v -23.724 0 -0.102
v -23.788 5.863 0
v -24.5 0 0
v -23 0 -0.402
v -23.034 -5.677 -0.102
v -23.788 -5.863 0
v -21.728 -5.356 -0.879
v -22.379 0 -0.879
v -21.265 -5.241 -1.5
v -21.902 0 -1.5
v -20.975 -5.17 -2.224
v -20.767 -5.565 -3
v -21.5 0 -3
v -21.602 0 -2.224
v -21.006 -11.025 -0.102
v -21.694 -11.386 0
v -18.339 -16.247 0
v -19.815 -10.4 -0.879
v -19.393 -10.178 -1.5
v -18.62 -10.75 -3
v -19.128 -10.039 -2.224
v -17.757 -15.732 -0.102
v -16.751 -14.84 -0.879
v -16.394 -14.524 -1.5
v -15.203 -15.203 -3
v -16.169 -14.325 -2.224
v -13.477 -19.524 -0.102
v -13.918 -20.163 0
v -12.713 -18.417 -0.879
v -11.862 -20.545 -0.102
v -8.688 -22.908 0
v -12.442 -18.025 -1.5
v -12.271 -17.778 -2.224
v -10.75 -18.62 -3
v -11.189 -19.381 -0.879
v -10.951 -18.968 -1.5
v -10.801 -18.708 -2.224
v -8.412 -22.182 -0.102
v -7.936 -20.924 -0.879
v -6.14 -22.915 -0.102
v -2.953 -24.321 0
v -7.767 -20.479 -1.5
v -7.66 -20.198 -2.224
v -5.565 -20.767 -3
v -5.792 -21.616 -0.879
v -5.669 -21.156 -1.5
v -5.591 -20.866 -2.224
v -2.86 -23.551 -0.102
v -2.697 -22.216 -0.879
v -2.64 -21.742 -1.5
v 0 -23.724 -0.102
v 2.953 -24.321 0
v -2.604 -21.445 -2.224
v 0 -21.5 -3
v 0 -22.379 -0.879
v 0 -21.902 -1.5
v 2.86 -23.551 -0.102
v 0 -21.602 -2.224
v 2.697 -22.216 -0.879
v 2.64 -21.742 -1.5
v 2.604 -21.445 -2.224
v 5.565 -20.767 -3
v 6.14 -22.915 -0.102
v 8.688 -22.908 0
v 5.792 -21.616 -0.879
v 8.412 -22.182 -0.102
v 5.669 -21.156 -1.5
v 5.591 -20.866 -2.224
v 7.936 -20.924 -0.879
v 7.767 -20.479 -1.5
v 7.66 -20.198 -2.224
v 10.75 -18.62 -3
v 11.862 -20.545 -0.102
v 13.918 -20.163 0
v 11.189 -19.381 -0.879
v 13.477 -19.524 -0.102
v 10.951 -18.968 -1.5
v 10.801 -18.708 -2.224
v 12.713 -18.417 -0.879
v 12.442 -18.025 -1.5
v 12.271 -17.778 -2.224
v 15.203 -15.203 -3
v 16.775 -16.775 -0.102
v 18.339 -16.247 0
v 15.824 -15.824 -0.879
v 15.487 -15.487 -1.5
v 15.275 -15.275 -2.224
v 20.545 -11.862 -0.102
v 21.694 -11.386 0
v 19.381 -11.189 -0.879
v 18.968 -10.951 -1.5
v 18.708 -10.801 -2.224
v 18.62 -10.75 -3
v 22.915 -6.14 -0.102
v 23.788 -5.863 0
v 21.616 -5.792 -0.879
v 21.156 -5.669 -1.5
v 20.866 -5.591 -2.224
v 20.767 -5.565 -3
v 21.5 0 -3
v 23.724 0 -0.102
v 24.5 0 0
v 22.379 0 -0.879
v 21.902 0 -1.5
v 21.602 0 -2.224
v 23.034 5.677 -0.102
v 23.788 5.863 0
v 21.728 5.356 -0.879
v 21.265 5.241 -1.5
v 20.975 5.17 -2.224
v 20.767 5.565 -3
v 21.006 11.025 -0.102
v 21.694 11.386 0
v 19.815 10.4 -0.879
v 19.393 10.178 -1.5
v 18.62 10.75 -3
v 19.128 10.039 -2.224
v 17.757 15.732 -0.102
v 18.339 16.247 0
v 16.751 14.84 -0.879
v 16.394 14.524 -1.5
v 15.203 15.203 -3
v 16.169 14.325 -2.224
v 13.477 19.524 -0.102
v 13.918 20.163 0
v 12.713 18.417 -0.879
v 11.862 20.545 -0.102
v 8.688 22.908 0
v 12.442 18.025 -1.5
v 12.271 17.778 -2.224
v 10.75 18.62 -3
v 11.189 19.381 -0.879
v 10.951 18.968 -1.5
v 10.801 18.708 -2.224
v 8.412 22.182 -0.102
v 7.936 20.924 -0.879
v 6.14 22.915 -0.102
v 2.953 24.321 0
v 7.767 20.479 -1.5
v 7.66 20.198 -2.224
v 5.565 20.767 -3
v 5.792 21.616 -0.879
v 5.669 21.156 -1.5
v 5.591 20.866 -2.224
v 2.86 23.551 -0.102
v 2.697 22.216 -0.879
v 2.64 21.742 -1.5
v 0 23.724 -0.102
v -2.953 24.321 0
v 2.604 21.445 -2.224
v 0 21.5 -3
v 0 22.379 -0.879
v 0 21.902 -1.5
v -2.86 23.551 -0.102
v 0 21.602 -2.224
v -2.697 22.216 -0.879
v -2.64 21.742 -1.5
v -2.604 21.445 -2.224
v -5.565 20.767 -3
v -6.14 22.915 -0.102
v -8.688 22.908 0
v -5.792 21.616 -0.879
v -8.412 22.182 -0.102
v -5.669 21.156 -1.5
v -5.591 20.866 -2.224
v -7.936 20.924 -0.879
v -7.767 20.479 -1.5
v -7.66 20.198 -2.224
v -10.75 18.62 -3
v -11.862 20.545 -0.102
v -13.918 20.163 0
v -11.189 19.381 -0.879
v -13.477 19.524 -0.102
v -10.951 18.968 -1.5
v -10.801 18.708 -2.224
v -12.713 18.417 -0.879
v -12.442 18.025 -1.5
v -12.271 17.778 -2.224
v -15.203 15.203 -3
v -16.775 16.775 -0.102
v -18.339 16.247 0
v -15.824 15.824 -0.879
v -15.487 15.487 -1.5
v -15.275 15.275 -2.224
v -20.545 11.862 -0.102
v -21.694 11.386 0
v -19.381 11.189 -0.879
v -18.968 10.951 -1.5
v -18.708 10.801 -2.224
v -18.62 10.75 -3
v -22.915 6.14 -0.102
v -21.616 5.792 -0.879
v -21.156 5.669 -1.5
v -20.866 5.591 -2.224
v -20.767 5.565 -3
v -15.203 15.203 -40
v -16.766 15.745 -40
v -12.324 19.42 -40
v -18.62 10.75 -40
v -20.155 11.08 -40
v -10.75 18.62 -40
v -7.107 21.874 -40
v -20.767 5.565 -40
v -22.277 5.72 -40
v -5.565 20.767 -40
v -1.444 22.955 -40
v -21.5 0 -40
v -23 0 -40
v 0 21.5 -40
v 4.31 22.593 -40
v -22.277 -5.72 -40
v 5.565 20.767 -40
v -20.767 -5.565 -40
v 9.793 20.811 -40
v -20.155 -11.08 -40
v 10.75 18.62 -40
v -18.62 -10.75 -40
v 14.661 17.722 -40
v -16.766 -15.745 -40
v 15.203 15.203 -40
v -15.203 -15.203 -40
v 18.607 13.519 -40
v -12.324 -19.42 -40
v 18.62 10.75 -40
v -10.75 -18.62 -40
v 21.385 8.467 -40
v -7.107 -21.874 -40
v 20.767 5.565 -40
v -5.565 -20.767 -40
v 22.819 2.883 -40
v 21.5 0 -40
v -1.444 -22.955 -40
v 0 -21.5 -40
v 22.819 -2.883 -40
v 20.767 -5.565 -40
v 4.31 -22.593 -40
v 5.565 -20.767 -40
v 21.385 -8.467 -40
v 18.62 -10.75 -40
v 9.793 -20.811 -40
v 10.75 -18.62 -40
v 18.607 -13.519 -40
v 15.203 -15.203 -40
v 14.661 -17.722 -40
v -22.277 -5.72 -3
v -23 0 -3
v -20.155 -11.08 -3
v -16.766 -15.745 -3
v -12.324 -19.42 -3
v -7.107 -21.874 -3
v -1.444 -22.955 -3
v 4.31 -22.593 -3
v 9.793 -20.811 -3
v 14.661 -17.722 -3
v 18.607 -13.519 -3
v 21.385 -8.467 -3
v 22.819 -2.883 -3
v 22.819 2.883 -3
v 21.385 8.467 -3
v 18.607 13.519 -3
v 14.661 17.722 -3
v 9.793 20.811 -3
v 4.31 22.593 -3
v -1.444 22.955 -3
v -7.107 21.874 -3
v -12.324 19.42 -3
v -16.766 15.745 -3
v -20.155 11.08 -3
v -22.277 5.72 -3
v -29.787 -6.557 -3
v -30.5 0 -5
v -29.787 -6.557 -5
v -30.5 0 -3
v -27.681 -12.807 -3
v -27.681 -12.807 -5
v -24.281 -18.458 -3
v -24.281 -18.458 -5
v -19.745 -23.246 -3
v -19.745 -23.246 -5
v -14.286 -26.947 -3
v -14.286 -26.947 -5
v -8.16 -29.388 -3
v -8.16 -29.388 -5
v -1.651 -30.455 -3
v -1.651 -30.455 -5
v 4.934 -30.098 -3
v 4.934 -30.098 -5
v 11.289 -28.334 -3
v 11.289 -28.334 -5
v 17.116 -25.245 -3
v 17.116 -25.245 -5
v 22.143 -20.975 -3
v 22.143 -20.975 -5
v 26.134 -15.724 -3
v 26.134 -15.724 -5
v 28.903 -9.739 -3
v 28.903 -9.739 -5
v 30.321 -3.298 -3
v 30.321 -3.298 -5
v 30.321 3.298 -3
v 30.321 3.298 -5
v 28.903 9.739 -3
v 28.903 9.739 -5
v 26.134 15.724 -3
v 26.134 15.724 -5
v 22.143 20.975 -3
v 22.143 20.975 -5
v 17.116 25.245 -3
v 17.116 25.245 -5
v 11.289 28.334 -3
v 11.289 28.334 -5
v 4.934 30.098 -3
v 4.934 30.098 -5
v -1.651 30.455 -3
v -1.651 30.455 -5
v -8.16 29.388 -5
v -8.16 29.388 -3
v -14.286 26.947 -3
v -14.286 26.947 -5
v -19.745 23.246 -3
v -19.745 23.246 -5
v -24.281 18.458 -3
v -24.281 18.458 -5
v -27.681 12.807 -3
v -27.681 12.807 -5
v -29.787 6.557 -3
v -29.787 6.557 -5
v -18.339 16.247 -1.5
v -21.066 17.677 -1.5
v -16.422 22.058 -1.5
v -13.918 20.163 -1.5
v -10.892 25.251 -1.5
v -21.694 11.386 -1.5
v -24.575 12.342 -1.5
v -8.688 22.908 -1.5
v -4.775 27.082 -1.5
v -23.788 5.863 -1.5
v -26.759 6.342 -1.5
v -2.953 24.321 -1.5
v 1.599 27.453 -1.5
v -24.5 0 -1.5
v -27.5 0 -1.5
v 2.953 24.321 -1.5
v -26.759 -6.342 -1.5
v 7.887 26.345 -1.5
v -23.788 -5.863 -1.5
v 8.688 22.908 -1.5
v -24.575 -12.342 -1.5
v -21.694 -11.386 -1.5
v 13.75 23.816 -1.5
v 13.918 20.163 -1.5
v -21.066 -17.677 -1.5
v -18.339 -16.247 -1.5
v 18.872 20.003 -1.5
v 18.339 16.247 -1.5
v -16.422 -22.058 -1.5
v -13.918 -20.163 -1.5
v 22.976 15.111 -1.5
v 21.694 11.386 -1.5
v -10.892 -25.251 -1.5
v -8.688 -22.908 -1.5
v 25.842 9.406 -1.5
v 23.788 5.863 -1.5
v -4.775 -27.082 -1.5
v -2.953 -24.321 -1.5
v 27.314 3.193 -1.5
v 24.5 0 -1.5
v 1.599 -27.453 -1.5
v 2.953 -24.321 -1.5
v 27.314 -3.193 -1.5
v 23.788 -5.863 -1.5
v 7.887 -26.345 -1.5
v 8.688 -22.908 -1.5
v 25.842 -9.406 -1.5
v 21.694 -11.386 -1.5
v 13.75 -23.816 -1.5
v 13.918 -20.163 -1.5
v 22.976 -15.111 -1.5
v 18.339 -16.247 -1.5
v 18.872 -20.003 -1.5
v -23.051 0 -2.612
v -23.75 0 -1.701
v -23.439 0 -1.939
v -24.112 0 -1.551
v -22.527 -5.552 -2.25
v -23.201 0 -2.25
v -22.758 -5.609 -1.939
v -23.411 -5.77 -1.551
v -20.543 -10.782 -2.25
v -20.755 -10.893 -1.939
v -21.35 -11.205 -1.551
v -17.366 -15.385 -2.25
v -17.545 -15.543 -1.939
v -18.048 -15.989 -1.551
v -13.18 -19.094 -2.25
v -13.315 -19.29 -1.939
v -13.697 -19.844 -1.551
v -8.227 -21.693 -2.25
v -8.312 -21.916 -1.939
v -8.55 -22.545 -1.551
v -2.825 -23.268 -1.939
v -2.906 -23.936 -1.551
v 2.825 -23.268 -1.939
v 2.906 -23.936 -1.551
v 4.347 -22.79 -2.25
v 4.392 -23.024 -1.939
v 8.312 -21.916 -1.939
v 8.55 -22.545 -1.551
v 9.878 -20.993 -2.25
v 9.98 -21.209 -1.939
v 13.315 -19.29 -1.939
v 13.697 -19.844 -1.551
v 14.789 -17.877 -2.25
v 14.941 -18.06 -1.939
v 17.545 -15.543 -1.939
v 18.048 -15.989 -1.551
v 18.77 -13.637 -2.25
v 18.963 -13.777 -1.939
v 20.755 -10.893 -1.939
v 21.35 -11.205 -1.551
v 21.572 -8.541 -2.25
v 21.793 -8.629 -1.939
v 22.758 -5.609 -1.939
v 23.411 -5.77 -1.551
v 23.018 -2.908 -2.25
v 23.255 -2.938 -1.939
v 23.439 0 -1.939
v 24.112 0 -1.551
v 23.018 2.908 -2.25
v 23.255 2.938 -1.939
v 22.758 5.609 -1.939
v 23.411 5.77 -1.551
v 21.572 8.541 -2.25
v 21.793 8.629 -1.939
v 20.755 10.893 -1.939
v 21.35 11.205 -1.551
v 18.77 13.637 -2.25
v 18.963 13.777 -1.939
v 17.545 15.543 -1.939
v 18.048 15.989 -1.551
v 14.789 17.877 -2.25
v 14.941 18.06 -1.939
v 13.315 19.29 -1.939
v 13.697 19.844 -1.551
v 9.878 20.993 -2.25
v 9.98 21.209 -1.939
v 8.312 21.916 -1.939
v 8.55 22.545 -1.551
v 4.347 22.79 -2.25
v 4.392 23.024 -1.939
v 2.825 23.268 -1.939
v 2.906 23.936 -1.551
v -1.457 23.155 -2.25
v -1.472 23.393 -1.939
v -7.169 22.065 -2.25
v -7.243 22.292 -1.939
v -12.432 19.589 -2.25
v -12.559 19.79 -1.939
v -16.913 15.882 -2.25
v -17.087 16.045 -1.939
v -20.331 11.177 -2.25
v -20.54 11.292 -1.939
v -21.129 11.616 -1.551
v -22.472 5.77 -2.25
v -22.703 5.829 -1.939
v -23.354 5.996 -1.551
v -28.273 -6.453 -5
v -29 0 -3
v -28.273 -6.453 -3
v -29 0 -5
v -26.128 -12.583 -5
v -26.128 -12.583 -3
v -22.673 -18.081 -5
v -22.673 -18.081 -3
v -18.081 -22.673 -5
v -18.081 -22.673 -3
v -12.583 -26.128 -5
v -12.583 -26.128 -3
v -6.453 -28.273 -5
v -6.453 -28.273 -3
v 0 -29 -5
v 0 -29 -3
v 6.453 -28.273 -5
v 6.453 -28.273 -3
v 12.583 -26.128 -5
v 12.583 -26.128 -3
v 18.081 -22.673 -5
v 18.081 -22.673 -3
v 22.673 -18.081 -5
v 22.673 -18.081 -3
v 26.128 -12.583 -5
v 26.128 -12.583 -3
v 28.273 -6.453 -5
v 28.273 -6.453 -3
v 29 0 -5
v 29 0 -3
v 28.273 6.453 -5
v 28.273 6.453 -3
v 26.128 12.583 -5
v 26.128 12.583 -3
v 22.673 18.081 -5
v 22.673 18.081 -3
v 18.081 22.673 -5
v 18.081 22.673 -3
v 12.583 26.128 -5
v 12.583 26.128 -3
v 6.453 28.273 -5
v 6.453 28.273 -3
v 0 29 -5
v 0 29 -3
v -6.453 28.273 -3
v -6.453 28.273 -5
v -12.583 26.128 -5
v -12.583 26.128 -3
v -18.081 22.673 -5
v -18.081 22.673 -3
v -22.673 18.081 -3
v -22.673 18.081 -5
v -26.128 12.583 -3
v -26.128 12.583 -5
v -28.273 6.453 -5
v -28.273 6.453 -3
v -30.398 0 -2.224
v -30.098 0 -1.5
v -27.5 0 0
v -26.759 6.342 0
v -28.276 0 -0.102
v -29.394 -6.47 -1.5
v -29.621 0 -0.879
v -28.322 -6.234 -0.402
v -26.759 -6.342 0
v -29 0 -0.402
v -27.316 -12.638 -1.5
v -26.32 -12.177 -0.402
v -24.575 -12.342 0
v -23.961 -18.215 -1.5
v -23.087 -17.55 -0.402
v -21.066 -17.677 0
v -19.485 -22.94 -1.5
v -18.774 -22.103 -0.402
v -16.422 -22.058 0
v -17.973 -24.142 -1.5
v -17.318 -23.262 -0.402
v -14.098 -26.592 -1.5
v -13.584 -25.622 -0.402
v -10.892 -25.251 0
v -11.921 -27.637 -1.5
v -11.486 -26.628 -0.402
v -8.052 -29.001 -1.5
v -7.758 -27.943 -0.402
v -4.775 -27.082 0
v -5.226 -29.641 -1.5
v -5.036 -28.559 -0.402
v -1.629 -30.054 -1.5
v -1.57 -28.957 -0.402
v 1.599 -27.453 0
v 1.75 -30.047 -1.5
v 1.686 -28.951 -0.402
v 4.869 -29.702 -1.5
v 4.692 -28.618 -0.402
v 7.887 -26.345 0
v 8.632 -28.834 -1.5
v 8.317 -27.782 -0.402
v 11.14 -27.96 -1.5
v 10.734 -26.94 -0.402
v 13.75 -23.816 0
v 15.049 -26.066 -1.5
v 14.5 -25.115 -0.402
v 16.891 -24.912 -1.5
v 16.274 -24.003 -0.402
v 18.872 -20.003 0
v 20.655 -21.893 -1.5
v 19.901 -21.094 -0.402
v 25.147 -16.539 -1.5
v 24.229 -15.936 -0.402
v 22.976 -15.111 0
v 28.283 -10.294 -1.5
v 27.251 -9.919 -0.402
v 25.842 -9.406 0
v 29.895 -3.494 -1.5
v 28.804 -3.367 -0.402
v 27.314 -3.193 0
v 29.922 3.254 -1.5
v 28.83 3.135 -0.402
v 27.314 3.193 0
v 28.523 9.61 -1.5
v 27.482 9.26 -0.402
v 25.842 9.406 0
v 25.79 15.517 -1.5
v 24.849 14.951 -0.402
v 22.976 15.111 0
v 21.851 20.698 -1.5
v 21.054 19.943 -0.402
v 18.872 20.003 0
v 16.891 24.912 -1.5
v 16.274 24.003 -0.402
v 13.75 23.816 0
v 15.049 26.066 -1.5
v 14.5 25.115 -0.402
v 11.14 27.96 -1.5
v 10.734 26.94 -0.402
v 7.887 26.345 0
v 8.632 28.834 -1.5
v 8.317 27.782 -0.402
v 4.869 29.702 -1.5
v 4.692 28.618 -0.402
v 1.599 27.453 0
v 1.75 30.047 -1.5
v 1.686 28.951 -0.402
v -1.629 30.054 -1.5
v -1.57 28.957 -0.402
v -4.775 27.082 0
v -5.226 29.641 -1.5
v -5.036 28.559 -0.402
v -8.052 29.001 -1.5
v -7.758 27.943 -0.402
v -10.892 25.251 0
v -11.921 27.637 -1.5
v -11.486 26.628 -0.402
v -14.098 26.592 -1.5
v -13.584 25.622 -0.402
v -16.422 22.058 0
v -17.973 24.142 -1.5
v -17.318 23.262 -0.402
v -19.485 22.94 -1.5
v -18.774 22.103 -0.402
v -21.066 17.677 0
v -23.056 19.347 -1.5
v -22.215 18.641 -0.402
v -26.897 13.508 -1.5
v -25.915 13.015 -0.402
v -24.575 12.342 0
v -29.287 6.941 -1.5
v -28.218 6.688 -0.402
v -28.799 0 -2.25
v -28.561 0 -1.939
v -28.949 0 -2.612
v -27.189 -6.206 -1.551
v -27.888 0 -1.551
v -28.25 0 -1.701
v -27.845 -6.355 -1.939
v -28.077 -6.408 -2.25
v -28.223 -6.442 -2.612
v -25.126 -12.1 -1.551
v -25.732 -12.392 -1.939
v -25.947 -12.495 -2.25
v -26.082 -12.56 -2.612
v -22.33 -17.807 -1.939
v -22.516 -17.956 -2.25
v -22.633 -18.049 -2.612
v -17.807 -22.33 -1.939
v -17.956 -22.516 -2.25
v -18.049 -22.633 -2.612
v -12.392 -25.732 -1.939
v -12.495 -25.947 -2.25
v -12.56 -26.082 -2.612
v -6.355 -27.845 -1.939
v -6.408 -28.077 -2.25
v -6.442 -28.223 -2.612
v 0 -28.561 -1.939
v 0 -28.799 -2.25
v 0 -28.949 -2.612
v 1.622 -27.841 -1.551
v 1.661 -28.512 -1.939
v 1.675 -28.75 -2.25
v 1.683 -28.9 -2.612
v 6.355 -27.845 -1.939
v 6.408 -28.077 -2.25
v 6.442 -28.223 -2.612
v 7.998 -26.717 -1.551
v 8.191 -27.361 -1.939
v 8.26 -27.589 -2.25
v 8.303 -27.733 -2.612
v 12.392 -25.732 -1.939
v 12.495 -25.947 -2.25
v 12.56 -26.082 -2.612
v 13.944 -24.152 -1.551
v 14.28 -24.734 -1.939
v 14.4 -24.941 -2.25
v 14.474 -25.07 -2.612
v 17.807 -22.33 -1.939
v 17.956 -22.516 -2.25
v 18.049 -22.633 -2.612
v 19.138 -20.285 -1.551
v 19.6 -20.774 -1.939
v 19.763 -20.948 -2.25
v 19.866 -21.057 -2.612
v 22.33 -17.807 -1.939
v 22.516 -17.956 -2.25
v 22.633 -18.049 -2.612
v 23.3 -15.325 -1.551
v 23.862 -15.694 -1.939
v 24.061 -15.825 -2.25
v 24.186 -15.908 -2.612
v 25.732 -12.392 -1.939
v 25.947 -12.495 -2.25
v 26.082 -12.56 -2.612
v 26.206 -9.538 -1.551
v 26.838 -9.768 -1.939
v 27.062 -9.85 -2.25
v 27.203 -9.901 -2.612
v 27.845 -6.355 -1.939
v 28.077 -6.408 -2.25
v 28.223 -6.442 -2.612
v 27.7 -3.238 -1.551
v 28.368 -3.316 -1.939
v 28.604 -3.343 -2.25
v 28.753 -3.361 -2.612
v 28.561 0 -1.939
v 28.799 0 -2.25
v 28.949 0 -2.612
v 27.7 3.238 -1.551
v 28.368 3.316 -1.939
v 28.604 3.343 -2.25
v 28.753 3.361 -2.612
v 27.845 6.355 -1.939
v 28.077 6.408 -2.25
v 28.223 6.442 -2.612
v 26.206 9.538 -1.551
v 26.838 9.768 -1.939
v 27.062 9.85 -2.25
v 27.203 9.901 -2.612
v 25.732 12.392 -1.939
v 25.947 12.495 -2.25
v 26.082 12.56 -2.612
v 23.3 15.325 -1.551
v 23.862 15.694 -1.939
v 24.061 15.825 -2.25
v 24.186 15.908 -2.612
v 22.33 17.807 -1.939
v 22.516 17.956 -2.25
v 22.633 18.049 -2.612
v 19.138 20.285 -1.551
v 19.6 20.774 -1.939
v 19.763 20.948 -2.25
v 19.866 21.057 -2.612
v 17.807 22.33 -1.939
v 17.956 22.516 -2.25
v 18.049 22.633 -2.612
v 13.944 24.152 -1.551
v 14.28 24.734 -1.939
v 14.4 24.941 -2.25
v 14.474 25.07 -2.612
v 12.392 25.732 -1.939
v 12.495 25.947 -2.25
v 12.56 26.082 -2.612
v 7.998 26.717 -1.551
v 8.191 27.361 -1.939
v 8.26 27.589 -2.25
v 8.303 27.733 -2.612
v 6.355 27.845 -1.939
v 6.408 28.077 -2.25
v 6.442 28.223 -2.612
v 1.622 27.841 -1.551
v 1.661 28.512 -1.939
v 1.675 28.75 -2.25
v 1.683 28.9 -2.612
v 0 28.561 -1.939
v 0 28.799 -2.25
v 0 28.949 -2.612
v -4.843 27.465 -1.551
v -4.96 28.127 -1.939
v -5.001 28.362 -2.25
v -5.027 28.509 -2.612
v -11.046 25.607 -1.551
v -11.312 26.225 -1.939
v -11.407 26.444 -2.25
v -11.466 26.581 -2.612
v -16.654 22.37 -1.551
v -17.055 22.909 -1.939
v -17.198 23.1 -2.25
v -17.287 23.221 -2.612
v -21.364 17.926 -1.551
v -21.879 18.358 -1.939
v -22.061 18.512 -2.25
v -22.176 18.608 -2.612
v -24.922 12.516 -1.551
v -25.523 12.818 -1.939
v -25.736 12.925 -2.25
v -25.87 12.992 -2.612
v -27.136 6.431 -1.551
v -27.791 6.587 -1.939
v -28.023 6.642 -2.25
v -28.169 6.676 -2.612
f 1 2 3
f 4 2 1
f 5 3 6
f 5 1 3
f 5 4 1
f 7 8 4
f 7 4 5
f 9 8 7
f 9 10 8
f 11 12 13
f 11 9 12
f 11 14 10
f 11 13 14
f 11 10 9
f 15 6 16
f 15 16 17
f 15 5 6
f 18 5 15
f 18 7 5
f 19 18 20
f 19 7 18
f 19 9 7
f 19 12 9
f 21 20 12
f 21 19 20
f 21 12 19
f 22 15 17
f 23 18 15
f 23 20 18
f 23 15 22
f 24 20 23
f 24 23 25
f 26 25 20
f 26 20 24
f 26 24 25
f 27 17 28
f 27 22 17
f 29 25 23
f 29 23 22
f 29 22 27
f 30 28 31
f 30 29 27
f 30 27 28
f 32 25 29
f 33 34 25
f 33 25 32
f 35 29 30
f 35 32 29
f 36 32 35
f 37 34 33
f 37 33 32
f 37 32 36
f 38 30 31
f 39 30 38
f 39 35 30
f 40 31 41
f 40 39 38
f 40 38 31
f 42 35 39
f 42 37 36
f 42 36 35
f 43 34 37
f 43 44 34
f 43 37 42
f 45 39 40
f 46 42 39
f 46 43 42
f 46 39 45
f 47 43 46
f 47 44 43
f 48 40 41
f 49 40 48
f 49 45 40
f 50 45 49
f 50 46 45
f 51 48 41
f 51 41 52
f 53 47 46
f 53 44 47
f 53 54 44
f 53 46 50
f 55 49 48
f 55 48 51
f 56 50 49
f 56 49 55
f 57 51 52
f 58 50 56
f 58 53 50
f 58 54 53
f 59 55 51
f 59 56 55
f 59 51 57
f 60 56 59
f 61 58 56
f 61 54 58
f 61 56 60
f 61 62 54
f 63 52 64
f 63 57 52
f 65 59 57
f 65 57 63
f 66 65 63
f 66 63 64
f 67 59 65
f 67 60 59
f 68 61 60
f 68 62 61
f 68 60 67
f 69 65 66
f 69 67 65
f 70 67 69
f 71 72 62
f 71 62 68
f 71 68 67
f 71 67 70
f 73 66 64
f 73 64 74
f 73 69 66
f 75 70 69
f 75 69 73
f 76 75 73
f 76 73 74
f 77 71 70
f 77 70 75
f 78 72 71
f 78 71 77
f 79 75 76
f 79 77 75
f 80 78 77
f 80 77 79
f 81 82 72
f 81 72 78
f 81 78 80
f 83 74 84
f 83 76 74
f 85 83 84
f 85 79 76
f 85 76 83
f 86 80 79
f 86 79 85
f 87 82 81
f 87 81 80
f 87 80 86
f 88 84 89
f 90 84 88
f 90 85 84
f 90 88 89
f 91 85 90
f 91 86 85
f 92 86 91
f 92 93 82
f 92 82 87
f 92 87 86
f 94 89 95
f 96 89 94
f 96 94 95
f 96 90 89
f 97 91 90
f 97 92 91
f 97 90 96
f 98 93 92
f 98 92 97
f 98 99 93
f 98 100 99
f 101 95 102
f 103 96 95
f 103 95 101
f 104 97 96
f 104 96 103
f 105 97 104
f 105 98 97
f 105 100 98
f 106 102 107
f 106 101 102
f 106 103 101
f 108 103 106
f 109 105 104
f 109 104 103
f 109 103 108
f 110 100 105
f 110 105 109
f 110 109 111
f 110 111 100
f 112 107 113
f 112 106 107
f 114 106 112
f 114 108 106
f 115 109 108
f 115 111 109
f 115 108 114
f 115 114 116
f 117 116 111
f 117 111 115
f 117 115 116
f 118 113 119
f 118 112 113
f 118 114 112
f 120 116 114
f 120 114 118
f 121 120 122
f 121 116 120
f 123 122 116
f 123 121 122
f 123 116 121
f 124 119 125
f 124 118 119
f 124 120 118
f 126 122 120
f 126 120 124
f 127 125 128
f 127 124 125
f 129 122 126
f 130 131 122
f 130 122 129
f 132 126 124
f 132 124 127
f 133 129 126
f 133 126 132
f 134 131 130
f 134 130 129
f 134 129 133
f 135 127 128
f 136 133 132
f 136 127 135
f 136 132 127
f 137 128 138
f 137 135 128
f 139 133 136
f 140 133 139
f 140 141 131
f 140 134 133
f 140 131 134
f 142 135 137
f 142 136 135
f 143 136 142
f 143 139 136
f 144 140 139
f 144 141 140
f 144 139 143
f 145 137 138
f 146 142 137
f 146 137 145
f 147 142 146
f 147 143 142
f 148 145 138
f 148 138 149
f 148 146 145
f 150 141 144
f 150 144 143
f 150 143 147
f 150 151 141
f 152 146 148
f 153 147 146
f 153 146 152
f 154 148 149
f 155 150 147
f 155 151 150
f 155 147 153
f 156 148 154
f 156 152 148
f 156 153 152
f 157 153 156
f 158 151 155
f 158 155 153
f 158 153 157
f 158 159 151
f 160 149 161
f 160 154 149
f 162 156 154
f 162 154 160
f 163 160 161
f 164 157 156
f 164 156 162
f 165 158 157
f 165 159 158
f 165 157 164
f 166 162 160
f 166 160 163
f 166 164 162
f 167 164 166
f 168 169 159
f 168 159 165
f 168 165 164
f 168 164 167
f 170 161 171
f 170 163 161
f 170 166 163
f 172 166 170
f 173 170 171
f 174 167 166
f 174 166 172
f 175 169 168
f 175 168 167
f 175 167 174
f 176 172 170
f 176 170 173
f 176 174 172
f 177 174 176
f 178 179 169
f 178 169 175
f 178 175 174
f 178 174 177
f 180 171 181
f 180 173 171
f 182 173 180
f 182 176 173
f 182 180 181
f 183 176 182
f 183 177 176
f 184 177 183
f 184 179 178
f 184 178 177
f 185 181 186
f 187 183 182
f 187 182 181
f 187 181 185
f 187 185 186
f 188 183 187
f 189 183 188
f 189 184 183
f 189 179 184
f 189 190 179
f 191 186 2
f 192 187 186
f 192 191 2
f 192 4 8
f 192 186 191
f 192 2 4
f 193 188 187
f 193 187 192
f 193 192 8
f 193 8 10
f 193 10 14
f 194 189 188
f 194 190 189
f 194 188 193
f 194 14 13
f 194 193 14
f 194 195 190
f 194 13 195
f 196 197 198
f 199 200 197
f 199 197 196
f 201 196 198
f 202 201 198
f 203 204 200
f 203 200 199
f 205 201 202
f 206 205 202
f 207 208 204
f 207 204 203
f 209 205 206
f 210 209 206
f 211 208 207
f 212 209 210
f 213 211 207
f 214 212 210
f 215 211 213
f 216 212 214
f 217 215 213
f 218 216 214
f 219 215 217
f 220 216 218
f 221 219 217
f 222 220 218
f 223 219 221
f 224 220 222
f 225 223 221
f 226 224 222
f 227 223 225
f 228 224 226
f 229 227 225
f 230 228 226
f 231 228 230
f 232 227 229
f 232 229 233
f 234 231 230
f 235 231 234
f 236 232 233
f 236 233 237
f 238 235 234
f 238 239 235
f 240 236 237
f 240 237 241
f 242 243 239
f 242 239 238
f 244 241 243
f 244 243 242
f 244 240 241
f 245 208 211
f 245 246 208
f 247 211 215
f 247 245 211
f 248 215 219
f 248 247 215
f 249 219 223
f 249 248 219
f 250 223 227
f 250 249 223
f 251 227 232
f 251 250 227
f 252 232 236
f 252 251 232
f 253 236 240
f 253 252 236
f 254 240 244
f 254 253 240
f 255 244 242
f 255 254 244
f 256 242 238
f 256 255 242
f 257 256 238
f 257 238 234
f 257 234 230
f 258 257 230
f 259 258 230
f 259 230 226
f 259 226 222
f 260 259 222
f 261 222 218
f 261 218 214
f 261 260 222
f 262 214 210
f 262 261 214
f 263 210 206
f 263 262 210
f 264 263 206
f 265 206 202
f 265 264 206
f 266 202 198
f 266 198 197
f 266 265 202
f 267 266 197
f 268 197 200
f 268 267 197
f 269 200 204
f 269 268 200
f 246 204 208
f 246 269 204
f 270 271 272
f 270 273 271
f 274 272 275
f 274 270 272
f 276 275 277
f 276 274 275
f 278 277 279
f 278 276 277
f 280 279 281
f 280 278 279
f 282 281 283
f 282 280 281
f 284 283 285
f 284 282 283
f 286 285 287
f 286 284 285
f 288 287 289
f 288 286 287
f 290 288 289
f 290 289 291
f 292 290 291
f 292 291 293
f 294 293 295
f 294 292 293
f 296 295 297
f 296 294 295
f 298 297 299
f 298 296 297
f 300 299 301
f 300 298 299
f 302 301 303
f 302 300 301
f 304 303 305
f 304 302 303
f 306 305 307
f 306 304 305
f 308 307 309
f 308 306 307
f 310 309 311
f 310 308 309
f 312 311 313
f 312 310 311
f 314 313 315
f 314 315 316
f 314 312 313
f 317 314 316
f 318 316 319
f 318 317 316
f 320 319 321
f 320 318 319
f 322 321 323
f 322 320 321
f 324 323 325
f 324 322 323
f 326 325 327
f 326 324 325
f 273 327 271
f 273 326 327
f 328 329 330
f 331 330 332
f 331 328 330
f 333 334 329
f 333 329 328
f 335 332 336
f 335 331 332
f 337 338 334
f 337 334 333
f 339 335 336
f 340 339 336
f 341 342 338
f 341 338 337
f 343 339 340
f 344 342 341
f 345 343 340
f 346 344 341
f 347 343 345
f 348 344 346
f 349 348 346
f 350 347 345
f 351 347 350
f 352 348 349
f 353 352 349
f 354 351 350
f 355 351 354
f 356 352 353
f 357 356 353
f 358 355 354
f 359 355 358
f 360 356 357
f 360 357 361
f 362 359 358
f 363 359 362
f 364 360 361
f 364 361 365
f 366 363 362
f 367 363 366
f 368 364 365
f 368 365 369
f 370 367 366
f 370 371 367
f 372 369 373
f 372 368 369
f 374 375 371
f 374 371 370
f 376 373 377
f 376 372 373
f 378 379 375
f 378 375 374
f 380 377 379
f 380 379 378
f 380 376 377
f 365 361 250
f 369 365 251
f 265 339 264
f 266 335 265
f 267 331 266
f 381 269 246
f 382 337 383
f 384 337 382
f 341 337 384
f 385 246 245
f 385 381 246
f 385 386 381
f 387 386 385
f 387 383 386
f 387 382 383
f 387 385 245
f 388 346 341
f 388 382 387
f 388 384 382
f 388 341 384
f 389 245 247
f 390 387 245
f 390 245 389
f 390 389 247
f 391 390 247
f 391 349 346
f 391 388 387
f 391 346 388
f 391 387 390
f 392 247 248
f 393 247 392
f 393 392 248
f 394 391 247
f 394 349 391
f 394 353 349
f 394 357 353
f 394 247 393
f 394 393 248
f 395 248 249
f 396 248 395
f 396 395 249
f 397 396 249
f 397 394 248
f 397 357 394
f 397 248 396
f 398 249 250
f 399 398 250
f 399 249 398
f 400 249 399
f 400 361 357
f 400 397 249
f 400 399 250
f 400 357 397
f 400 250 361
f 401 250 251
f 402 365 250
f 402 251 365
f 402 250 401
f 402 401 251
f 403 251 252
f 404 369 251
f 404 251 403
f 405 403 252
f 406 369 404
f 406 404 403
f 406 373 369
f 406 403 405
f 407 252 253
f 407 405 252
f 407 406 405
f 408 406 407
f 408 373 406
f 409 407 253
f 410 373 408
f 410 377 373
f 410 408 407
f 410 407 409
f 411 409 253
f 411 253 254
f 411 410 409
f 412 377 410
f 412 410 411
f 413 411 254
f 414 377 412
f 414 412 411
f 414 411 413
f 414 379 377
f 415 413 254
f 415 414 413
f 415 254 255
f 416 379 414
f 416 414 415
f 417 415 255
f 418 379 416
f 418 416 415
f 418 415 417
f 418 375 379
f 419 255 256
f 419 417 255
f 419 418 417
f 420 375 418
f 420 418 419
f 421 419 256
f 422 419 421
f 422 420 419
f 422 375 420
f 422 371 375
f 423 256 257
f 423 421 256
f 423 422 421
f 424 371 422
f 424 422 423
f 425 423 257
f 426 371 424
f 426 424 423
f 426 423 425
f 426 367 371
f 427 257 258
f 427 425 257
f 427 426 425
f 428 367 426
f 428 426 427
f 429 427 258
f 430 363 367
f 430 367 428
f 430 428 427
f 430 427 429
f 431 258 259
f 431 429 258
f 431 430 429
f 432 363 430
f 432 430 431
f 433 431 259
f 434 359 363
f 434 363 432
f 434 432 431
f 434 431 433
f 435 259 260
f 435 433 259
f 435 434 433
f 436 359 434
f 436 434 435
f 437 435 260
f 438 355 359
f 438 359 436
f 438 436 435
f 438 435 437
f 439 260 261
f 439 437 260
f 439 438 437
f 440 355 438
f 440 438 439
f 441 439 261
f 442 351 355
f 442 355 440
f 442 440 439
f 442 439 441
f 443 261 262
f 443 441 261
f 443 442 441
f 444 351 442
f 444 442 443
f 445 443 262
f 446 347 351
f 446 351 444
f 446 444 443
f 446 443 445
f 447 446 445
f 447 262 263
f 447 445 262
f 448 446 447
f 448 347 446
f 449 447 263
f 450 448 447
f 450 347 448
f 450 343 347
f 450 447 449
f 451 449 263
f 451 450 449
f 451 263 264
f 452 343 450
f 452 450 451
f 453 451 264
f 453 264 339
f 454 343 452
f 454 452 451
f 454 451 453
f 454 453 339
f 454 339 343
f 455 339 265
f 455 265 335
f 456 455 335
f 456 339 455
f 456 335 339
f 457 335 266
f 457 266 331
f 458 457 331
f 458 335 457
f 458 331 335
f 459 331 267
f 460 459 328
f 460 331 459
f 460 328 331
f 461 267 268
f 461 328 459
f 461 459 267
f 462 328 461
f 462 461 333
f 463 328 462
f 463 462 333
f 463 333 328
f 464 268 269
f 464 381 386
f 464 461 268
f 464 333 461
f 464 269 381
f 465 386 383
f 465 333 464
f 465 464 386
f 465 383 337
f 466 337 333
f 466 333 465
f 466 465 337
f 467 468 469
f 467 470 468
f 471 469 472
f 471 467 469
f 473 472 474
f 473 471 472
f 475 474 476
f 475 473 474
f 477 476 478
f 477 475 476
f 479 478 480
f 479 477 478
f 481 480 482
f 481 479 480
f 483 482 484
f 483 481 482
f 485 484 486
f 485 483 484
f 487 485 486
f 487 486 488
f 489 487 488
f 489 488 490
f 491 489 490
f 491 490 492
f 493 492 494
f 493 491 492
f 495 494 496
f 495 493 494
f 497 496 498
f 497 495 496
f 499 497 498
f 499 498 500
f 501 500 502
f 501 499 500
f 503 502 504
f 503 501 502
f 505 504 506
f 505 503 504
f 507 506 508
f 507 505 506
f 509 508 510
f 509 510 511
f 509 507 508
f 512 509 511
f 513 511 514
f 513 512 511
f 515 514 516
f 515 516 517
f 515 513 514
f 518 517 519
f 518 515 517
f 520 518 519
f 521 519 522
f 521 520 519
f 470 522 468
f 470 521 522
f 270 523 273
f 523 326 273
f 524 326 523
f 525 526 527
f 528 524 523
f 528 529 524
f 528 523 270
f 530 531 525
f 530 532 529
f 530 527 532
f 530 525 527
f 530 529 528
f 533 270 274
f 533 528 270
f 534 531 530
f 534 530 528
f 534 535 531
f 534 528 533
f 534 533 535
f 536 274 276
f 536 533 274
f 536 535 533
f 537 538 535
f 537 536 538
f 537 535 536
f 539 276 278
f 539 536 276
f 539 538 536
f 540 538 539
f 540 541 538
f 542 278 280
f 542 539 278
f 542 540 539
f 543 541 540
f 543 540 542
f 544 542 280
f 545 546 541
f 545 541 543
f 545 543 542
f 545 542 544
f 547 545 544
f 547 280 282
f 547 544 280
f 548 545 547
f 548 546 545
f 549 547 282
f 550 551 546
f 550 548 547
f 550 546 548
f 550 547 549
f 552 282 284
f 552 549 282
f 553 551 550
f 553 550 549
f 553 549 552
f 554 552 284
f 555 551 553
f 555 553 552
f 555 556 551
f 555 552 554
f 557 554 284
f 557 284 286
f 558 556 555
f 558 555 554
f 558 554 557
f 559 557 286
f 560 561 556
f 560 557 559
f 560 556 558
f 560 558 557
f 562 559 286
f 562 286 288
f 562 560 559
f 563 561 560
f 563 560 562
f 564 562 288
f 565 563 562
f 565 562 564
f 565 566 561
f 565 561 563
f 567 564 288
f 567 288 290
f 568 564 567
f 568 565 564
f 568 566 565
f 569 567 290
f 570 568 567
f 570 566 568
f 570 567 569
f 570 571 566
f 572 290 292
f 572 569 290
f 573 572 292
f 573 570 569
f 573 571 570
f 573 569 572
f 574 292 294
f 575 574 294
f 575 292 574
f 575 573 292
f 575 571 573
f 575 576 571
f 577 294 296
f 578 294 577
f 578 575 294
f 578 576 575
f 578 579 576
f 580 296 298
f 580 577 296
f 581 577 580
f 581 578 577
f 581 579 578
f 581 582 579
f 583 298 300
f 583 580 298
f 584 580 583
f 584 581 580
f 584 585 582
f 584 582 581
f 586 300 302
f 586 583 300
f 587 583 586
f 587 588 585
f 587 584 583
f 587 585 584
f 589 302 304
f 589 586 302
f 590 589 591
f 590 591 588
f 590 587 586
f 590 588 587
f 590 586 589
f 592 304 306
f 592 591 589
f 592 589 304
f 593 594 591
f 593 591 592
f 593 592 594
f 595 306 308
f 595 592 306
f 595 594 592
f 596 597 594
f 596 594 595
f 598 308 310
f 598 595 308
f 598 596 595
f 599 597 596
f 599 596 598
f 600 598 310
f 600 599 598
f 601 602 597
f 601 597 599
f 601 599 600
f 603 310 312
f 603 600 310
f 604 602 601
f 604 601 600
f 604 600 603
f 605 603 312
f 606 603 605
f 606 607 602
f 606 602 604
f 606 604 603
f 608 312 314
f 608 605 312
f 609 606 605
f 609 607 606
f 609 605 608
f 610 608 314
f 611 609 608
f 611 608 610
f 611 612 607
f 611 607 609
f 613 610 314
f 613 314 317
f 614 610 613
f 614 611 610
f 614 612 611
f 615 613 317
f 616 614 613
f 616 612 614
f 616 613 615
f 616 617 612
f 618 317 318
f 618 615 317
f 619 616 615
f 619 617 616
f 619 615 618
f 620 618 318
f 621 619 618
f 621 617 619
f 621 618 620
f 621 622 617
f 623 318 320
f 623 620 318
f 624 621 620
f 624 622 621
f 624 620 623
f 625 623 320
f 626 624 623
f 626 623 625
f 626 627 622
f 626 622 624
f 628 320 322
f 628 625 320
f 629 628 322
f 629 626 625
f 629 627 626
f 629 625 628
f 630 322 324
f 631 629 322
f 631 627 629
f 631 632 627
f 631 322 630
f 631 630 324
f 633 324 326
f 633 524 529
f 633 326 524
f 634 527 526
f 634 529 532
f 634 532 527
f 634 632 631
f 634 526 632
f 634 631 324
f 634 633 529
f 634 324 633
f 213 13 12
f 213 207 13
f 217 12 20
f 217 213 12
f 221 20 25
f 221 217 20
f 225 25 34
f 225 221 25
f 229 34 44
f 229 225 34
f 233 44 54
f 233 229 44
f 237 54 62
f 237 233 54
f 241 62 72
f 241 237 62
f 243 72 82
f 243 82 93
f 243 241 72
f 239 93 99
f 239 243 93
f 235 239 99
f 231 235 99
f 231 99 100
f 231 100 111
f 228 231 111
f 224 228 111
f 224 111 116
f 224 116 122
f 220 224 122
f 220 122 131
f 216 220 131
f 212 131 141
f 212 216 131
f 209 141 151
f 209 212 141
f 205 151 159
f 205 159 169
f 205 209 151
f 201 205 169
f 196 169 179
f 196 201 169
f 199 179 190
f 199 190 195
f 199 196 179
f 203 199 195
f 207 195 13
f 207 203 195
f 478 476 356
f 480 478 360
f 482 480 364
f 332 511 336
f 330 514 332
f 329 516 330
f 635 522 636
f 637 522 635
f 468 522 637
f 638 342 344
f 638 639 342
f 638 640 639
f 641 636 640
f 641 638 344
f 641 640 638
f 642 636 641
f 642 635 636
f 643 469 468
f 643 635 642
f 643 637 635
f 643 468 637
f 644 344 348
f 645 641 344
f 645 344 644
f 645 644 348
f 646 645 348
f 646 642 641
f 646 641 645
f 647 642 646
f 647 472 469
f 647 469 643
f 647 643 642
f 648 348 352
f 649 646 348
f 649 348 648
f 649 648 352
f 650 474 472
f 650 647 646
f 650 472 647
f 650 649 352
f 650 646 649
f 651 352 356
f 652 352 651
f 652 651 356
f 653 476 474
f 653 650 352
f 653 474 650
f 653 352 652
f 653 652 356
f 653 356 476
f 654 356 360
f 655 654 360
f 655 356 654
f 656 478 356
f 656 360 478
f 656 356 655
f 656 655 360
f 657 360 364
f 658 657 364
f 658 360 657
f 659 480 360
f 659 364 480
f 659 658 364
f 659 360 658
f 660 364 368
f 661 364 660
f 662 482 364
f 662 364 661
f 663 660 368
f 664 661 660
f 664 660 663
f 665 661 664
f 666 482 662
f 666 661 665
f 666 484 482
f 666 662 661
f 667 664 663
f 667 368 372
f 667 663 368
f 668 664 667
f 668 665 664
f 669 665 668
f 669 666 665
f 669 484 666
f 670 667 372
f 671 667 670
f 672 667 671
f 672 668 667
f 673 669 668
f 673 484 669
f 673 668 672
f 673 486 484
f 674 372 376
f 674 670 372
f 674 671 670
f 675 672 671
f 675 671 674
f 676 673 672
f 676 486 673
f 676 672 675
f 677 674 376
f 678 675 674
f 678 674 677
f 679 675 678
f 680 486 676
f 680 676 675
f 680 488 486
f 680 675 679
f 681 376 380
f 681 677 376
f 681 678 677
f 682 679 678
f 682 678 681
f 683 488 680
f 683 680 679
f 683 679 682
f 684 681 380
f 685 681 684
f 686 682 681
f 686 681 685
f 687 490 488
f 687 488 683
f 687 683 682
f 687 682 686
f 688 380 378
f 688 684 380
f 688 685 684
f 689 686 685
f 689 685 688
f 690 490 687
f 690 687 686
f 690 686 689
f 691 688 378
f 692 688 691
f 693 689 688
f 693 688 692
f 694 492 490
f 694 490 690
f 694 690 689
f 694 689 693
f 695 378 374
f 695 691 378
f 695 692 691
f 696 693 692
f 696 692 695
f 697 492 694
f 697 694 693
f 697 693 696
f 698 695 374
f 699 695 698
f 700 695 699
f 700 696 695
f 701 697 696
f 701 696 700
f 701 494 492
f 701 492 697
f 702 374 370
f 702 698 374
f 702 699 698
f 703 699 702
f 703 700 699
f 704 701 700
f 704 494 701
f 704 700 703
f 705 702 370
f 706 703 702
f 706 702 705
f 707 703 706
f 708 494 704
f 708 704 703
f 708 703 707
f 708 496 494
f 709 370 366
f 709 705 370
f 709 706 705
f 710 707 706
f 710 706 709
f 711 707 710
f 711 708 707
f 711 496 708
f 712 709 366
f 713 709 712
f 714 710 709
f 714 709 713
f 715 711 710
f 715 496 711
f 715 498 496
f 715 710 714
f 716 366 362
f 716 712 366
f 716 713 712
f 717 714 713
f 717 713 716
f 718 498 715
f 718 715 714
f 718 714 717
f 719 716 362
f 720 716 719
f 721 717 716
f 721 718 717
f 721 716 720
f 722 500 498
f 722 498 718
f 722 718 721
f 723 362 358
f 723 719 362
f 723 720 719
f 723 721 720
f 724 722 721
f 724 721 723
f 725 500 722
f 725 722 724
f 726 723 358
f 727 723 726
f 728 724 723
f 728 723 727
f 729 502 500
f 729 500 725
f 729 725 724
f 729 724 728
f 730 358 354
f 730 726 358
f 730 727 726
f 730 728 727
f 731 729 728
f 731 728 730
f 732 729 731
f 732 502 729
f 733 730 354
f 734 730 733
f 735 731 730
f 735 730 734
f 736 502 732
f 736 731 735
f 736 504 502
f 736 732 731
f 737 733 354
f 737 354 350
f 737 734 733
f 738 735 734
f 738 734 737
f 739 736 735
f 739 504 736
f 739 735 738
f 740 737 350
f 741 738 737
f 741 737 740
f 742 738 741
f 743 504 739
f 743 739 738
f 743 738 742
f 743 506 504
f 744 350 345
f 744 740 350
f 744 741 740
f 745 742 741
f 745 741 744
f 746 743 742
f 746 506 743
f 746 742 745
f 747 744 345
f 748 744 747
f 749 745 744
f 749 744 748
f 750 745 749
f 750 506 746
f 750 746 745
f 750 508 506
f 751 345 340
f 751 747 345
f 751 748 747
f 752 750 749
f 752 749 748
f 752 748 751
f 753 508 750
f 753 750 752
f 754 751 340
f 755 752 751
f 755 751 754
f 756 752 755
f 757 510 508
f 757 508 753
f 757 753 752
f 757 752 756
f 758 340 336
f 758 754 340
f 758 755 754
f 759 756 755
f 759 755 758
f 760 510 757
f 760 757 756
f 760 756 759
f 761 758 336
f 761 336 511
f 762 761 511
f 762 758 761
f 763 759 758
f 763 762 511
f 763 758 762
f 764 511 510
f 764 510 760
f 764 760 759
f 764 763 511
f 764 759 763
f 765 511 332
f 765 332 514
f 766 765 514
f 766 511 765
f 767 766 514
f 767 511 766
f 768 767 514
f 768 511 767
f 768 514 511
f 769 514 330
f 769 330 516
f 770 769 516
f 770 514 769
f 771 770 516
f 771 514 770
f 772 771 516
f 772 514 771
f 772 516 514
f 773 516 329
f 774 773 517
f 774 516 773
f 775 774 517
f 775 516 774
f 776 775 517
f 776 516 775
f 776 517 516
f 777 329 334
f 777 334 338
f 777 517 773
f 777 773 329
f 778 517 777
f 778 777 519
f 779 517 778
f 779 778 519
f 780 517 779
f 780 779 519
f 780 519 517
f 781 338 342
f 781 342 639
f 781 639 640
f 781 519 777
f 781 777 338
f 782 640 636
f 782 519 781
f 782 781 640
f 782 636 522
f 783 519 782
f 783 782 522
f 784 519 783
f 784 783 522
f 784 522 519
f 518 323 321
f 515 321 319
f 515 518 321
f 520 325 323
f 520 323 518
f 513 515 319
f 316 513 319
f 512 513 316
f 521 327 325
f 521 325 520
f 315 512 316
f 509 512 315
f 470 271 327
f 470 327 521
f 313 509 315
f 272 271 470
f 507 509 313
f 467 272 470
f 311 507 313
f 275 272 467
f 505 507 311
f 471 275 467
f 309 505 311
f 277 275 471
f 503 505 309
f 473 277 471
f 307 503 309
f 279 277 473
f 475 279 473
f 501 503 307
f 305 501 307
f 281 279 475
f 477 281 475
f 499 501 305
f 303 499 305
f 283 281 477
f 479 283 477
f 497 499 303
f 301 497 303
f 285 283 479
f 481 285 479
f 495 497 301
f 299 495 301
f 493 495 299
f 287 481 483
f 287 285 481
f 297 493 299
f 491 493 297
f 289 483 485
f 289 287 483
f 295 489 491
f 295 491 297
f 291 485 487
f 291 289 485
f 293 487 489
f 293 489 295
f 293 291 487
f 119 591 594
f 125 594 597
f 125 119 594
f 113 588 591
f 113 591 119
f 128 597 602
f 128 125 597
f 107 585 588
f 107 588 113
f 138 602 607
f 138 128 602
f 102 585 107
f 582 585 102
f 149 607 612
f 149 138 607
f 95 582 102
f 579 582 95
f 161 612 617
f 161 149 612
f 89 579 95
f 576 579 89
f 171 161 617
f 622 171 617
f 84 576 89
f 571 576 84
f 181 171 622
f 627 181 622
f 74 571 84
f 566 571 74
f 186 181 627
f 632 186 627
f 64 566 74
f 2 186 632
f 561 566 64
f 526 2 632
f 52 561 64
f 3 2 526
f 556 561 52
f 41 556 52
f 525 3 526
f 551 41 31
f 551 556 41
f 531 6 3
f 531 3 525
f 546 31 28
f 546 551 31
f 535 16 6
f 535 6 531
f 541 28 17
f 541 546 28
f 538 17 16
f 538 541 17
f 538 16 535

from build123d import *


with BuildPart() as part:
    # Esboço1 → Revolução1 (revolve)
    with BuildSketch(Plane(origin=(0, 0, 0), x_dir=(0, 0, -1), z_dir=(1, 0, 0)), mode=Mode.PRIVATE) as revolu_o1_sk:
        with BuildLine():
            Line((5, 30.5), (3, 30.5))
            ThreePointArc((3, 30.5), (0.878679656, 29.621320344), (0, 27.5))
            Line((0, 27.5), (0, 24.5))
            ThreePointArc((0, 24.5), (0.878679656, 22.378679656), (3, 21.5))
            Line((3, 21.5), (40, 21.5))
            Line((40, 21.5), (40, 23))
            Line((40, 23), (3, 23))
            ThreePointArc((3, 23), (1.939339828, 23.439339828), (1.5, 24.5))
            Line((1.5, 24.5), (1.5, 27.5))
            ThreePointArc((1.5, 27.5), (1.939339828, 28.560660172), (3, 29))
            Line((3, 29), (5, 29))
            Line((5, 29), (5, 30.5))
        make_face()
    revolve(revolu_o1_sk.sketch.rotate(Axis((0, 0, 0), (0, 0, 1)), 90), axis=Axis((0, 0, 0), (0, 0, 1)))


solid = part.part
